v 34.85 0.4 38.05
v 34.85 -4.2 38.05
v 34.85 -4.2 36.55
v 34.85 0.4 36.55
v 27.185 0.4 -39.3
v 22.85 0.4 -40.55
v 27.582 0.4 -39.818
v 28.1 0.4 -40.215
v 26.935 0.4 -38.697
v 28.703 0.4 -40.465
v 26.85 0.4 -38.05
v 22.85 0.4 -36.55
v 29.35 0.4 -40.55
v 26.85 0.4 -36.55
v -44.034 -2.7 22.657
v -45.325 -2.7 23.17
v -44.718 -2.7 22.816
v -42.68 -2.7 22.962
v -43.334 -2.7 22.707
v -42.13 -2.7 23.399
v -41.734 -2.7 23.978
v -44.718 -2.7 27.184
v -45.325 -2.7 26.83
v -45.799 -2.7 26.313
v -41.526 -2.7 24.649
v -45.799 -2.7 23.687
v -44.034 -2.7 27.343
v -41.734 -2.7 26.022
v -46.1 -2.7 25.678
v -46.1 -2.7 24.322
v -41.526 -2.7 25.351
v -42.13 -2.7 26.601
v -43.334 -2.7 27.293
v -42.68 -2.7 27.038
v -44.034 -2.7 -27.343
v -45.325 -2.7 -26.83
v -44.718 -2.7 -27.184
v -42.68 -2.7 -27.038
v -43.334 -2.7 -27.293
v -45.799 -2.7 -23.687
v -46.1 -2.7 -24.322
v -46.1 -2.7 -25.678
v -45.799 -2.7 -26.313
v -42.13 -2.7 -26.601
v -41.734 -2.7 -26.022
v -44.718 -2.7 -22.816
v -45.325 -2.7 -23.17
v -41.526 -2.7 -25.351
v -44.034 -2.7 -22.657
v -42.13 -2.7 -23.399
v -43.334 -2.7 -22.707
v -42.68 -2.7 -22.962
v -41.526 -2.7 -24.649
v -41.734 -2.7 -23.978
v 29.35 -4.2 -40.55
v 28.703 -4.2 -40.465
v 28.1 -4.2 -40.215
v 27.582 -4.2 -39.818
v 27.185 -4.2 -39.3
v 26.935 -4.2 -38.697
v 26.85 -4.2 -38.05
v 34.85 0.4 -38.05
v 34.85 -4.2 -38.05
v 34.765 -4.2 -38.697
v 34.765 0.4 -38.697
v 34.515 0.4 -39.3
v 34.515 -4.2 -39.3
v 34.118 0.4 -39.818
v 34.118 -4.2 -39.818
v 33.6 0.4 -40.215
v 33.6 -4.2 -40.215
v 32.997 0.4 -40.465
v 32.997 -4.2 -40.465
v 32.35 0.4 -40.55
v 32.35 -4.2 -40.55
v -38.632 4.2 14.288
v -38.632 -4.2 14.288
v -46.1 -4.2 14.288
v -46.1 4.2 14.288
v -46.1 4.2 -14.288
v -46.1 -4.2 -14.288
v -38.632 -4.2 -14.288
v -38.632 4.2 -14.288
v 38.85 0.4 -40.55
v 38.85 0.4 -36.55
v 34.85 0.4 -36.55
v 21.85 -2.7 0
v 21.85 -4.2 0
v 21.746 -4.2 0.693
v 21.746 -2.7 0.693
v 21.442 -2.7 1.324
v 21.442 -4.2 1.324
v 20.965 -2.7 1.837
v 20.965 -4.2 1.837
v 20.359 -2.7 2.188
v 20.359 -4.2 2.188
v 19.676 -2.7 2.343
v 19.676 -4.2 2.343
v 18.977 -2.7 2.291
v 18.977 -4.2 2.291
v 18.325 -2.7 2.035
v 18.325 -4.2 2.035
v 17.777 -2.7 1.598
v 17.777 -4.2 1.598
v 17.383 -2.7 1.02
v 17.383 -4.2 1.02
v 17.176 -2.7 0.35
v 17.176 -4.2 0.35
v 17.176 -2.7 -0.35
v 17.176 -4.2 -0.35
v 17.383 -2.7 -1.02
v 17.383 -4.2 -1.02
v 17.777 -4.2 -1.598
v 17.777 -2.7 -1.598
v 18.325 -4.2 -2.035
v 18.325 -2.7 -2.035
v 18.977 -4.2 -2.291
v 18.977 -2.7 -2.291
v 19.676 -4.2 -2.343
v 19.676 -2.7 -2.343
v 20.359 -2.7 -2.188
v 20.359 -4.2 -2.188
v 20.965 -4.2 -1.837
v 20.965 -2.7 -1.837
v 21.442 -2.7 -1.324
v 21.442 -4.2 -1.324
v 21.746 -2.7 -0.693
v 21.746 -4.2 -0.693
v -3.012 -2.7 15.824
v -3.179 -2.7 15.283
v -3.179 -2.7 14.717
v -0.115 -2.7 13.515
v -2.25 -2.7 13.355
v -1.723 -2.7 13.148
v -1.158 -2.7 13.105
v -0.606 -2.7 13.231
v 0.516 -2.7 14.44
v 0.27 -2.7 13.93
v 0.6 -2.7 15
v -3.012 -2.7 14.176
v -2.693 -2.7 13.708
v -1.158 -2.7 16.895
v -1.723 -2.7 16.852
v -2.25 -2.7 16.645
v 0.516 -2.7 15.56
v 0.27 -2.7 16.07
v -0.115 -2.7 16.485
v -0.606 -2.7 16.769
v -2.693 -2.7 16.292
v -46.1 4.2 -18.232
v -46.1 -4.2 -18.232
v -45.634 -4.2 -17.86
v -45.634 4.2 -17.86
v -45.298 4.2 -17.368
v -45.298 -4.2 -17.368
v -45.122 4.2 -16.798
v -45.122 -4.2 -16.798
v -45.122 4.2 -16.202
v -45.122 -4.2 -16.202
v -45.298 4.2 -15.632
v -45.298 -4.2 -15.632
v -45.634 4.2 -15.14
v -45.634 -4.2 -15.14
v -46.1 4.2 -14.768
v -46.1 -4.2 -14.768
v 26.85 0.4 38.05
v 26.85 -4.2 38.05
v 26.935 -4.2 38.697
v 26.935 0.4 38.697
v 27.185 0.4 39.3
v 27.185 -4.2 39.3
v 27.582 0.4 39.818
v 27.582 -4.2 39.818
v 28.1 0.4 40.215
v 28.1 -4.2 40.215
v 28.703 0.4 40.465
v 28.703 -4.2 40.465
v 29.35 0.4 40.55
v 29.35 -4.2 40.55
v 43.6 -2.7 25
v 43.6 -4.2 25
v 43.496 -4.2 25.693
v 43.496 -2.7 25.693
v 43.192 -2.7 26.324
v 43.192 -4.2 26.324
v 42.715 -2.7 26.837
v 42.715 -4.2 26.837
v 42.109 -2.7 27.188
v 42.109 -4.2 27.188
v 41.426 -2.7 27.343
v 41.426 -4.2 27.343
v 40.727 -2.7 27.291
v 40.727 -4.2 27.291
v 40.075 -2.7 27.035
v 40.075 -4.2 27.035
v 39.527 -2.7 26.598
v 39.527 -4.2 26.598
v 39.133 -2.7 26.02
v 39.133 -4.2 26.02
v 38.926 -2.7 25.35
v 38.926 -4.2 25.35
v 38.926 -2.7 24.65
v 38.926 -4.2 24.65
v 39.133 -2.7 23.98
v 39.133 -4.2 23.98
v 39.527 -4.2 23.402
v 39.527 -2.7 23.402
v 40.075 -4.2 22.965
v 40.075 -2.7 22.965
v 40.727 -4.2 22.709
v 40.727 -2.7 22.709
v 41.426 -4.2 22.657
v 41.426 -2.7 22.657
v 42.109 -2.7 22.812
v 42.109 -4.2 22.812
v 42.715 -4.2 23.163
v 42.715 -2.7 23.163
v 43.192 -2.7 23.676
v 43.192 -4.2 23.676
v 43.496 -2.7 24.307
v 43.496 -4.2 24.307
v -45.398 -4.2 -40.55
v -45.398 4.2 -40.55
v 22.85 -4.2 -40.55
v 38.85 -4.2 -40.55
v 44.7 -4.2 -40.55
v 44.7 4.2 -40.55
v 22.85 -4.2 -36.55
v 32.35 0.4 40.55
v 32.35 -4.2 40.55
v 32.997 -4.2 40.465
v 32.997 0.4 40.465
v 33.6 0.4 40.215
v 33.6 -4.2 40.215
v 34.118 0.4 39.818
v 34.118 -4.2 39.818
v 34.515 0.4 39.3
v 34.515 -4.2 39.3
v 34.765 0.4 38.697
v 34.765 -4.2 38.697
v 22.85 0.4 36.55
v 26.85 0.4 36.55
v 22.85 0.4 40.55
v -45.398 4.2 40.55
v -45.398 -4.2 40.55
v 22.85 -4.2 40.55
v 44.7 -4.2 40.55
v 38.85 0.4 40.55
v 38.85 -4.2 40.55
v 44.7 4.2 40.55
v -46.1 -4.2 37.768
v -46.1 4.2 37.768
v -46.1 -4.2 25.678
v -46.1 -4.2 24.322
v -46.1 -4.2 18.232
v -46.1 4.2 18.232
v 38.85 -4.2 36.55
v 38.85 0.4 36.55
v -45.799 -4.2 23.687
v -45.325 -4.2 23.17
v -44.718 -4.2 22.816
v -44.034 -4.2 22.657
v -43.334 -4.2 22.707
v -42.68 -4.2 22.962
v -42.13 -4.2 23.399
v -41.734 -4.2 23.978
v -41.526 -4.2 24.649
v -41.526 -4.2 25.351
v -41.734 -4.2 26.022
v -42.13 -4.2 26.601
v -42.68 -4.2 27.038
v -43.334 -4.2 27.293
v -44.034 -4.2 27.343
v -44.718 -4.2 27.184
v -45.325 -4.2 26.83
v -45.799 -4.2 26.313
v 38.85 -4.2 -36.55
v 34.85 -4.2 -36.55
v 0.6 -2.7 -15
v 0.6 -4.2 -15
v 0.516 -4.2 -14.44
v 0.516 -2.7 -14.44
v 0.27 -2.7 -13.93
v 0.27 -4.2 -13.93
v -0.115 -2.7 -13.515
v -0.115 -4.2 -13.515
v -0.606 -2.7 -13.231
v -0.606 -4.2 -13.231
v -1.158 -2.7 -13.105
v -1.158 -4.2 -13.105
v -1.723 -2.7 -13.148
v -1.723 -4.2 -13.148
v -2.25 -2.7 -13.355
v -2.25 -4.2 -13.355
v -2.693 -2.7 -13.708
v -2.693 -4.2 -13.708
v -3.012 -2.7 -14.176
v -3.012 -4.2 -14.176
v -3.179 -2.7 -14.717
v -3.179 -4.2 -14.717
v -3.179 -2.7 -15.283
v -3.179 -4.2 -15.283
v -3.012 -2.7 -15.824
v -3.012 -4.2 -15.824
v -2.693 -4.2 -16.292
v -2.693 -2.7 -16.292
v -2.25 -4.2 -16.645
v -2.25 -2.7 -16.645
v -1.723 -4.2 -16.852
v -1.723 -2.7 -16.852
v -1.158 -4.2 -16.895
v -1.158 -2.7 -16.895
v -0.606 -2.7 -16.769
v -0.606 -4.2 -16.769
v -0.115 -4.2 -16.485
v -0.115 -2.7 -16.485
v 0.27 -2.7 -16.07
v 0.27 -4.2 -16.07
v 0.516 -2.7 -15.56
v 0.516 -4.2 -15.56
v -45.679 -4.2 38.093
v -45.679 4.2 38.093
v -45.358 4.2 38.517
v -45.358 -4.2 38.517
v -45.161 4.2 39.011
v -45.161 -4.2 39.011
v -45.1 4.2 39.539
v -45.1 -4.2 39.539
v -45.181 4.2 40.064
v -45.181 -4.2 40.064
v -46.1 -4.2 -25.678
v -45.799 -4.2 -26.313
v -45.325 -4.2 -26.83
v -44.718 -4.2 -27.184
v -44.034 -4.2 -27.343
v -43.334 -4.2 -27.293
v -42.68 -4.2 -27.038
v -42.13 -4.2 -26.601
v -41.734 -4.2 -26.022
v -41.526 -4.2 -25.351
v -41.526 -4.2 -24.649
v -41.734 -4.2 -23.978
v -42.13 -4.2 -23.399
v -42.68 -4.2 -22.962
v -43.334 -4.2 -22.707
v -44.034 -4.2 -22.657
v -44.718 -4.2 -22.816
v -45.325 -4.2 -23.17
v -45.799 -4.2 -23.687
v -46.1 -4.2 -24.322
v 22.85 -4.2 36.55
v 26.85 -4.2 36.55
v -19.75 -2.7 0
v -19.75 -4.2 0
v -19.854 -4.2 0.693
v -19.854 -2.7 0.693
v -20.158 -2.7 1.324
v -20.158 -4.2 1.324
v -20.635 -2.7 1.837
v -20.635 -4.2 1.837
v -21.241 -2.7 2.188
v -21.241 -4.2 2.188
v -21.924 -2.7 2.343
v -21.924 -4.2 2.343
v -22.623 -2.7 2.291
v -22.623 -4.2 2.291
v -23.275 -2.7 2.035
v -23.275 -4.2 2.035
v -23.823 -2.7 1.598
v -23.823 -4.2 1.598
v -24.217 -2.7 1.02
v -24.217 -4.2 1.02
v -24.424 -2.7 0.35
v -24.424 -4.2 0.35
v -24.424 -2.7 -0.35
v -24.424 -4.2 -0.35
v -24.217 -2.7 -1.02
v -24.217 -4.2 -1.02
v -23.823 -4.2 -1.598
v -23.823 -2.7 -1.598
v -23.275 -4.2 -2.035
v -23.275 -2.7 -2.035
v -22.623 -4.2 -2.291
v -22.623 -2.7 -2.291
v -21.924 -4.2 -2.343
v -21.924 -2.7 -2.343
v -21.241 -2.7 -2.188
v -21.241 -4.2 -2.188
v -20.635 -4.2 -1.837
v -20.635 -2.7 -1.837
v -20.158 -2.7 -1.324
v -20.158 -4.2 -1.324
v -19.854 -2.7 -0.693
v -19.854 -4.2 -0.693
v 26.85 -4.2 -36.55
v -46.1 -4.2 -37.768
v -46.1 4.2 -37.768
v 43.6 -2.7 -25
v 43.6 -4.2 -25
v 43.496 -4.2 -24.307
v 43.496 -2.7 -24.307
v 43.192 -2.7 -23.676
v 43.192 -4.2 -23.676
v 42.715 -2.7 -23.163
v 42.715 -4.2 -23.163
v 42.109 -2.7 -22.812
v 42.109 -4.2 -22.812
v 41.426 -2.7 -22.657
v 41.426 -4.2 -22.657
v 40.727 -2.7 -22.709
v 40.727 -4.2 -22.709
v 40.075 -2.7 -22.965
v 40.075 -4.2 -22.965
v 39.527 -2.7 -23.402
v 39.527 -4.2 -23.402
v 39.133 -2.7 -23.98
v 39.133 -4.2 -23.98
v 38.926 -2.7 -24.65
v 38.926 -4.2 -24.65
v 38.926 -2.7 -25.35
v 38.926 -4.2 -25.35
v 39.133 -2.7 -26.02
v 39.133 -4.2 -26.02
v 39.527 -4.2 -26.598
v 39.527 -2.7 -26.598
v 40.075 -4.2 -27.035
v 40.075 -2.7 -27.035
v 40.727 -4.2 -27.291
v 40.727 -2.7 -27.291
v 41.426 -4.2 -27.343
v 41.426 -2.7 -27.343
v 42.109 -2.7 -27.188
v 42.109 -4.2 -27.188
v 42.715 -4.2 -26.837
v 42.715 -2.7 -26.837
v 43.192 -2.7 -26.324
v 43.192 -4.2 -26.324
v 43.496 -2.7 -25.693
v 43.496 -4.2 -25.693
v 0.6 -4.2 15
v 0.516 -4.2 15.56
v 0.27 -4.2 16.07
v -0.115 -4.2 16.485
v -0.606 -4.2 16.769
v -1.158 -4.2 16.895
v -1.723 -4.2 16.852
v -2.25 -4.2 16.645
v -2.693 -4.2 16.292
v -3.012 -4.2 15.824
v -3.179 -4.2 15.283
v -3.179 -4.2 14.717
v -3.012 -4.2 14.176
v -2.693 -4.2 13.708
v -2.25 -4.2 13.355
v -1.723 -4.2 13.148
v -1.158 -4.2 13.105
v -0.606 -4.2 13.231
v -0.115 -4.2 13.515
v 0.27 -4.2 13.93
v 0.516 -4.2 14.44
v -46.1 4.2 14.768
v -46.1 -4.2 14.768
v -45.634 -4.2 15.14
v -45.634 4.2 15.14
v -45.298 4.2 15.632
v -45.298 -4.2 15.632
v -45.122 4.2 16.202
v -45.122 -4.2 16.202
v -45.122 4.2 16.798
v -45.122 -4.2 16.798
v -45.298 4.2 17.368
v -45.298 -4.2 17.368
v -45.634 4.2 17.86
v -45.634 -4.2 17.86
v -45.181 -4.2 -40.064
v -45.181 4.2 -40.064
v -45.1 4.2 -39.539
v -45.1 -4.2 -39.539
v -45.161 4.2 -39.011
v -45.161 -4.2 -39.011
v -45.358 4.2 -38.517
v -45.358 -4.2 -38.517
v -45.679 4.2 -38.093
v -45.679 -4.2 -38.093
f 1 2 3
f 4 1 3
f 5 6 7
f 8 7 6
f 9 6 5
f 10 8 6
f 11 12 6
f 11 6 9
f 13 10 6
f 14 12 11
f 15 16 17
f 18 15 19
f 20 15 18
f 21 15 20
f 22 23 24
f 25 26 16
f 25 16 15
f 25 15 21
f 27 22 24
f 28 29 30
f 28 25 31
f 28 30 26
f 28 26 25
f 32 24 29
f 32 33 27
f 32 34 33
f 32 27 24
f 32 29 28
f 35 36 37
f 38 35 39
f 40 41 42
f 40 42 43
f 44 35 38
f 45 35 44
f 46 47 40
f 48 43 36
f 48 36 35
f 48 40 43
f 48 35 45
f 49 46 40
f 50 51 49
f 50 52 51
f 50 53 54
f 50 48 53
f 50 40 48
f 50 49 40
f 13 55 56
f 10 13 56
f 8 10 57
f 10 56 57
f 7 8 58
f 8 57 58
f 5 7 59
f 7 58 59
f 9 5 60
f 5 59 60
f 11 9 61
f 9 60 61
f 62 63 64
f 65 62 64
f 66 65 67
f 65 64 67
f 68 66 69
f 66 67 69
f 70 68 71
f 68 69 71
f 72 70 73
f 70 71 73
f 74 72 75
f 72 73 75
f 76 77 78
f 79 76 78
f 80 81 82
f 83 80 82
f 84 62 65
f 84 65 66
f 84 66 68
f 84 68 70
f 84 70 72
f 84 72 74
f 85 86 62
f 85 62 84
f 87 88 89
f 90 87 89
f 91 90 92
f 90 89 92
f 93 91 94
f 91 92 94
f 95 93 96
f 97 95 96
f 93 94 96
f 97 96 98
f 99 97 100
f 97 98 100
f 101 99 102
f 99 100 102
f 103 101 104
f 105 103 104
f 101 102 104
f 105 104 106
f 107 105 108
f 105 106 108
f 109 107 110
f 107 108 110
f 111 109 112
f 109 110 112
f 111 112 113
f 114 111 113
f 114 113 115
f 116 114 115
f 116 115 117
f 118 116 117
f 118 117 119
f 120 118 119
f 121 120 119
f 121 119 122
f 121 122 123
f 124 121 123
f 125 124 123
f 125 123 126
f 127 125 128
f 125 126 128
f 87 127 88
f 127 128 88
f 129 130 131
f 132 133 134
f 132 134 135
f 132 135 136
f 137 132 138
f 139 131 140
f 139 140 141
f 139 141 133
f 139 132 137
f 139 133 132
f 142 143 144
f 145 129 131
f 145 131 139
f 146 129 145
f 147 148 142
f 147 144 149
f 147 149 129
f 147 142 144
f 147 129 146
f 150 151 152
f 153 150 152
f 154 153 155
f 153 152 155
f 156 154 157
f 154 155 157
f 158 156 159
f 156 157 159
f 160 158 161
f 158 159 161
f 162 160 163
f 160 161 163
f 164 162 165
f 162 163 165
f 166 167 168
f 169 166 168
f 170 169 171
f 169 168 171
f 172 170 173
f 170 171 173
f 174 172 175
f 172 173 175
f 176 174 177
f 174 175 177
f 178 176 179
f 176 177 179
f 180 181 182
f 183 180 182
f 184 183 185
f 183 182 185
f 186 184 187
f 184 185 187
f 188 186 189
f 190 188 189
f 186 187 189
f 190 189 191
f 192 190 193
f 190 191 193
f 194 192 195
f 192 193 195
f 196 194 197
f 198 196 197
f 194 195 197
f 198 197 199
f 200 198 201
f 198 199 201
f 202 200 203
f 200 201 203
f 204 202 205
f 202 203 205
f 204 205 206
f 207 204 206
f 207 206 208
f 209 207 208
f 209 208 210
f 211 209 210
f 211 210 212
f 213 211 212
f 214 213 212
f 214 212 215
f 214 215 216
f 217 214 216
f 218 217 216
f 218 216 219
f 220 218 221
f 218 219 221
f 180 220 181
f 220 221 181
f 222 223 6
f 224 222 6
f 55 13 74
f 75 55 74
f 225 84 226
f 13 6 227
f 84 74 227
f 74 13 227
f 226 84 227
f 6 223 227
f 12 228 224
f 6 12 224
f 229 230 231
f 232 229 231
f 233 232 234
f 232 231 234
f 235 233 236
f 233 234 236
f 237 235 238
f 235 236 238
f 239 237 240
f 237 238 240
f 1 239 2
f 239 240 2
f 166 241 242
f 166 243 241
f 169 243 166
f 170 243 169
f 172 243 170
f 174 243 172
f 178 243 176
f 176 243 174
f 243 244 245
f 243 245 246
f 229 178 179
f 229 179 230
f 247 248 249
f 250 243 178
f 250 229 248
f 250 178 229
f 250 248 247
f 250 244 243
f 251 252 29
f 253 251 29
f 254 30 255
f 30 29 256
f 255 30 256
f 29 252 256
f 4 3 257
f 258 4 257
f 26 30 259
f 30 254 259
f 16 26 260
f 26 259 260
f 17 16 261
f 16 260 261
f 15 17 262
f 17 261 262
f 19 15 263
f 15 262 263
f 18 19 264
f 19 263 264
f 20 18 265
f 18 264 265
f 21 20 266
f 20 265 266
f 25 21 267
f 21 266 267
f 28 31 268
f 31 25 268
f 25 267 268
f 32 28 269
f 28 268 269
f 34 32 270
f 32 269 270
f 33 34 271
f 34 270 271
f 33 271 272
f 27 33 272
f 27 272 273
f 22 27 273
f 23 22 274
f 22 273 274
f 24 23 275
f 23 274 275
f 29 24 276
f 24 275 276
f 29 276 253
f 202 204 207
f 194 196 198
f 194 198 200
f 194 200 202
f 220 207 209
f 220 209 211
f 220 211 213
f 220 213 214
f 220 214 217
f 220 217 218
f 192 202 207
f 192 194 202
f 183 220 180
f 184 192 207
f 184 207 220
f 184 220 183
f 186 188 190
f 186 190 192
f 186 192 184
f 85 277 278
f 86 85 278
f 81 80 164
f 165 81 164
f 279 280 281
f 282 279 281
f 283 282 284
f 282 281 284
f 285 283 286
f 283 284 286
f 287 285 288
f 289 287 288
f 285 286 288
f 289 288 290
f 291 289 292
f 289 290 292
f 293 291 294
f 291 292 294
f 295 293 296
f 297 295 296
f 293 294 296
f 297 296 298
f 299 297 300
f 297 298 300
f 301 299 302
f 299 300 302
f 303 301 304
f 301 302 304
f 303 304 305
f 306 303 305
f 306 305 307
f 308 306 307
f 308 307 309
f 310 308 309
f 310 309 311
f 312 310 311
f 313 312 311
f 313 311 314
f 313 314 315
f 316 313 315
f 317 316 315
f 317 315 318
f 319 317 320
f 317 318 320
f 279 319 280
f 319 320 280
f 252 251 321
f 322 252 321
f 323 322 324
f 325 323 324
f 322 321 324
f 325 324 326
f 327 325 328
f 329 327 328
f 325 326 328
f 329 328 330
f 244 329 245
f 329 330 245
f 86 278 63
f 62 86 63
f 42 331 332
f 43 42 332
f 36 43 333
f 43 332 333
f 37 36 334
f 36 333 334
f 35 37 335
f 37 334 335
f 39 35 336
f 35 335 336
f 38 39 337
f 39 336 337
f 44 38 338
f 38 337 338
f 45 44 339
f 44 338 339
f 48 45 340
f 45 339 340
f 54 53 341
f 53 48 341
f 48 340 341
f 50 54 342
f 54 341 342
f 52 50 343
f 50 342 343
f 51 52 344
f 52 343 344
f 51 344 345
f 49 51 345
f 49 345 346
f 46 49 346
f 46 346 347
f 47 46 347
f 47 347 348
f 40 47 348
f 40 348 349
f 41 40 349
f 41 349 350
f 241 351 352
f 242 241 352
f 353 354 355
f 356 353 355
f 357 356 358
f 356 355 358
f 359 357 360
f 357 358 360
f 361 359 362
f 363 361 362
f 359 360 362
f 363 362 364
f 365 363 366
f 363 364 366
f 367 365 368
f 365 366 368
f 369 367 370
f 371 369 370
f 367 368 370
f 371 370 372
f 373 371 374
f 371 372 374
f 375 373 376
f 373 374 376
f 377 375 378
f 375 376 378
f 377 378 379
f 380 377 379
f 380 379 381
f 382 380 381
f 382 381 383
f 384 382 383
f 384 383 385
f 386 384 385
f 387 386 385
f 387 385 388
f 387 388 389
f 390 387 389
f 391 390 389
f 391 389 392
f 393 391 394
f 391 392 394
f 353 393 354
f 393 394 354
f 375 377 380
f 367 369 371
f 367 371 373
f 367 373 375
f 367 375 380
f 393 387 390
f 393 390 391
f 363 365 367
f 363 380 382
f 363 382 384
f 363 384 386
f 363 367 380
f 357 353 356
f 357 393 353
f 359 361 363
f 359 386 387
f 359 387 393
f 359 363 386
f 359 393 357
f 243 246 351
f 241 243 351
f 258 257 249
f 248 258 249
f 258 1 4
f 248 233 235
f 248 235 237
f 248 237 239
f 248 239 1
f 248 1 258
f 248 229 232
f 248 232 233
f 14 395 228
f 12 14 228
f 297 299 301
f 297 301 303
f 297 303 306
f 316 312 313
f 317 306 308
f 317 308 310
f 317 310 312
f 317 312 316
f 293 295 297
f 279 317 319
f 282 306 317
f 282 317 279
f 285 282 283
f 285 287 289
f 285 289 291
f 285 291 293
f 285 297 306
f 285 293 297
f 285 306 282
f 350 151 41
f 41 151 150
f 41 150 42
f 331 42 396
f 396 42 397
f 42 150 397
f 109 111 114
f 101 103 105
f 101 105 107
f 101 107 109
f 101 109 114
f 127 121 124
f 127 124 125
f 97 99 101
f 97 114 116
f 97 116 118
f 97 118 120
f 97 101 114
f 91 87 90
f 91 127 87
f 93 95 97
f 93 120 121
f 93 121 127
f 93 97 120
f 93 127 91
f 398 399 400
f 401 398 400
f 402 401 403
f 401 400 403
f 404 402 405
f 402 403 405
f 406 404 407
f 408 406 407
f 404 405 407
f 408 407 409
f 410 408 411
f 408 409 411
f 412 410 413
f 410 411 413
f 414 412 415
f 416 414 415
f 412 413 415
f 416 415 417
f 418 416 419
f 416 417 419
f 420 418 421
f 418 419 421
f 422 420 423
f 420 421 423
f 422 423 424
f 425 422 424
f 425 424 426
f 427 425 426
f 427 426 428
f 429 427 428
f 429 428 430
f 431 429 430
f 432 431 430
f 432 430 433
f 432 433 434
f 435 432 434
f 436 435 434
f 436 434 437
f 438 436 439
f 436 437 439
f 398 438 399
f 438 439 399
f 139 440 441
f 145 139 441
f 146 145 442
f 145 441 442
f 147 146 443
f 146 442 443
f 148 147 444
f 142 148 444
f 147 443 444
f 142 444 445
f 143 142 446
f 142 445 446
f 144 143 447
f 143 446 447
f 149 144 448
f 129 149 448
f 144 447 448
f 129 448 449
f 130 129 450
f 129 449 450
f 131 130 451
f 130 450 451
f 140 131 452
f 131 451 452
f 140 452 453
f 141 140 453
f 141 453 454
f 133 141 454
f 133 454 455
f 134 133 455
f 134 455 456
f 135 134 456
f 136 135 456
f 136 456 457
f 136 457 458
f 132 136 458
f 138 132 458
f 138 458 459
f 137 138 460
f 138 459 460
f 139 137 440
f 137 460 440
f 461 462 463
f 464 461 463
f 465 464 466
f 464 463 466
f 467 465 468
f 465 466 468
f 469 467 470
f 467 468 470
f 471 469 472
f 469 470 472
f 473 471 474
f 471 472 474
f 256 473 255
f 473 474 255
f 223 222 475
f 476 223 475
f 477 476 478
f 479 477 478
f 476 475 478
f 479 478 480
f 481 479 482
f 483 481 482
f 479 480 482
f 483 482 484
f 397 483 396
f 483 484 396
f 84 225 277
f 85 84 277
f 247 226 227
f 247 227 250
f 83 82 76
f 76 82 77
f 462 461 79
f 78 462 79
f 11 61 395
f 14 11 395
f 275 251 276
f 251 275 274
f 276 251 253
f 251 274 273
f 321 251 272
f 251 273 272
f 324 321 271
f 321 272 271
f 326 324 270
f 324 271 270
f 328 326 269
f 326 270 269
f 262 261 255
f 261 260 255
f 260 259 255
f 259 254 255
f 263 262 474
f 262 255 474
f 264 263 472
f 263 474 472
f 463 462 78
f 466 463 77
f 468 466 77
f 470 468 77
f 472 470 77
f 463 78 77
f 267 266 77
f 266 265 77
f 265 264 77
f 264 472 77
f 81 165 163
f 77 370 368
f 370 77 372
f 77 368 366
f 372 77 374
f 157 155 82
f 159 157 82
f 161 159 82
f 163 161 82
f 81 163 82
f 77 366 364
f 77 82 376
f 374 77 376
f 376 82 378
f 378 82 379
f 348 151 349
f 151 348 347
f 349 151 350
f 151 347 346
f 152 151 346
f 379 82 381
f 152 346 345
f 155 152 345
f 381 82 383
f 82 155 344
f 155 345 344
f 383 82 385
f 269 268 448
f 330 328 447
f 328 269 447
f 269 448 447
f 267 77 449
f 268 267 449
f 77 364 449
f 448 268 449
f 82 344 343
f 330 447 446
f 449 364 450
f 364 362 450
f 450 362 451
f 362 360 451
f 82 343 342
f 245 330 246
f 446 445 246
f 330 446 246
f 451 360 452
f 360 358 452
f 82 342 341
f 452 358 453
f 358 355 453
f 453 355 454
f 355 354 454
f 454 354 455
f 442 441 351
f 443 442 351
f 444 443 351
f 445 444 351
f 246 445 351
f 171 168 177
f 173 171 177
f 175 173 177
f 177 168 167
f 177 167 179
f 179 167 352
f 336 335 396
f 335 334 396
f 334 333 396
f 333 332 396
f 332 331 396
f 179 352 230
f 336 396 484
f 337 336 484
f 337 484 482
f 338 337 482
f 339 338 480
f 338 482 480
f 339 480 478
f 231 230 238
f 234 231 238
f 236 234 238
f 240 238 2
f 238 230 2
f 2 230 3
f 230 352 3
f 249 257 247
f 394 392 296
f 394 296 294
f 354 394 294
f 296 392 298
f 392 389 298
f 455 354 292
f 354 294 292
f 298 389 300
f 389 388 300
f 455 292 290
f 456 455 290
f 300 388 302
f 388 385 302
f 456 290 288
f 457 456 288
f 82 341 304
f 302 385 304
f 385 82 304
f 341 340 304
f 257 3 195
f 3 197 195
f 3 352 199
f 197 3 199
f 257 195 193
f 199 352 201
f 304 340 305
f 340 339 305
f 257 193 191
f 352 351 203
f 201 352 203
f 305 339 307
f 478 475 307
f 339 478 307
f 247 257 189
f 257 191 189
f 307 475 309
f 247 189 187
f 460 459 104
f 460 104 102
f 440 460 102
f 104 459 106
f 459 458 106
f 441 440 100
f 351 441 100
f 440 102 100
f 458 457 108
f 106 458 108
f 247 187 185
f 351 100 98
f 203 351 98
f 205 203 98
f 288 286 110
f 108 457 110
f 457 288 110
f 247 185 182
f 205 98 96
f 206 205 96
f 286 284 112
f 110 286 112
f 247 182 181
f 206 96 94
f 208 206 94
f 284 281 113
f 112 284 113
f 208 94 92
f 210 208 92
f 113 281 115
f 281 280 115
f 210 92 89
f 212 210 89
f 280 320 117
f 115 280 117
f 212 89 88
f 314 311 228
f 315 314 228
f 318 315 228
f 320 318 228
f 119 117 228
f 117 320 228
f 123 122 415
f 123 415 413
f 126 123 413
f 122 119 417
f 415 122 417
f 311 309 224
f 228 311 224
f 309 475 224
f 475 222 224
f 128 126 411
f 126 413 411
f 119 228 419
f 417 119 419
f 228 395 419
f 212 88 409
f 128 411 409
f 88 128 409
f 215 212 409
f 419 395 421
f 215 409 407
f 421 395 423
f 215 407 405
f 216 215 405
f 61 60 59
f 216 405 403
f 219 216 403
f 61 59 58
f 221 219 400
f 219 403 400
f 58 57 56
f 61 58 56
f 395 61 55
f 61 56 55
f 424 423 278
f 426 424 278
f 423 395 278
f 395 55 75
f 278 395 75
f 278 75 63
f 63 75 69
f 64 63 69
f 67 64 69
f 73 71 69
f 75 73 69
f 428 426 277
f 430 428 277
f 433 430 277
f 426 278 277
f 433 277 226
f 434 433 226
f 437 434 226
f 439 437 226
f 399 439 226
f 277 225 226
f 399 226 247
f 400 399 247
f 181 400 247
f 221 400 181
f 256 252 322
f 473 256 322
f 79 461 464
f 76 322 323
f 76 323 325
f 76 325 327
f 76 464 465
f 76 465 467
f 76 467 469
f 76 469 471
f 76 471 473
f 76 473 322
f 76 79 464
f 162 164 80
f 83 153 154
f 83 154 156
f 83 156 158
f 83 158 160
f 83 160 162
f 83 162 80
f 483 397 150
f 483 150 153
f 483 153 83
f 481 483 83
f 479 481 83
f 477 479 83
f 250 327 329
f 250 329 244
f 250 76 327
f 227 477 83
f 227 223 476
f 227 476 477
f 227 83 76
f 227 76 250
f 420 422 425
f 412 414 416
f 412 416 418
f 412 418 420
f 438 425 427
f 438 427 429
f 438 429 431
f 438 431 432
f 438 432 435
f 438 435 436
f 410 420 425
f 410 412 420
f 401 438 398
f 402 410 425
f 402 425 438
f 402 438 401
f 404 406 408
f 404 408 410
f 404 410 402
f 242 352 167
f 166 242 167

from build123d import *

# Parameters (mm, degrees)
SKETCH1_W           = 92.2
SKETCH1_H           = 81.1
BOSS_EXTRUDE1_DEPTH = 4.2
CUT_EXTRUDE1_DEPTH  = 4.6
CUT_EXTRUDE2_DEPTH  = 9.4
CUT_EXTRUDE3_DEPTH  = 9.4
SKETCH5_R           = 2.35
SKETCH5_R_2         = 1.9
CUT_EXTRUDE4_DEPTH  = 1.5
SKETCH6_W           = 1.4
SKETCH6_H           = 81.1
CUT_EXTRUDE5_DEPTH  = 9.4


with BuildPart() as part:
    # Sketch1 → Boss-Extrude1 (new body, symmetric)
    with BuildSketch(Plane(origin=(0, 0, 0), x_dir=(1, 0, 0), z_dir=(0, 1, 0))):
        Rectangle(SKETCH1_W, SKETCH1_H)
    extrude(amount=BOSS_EXTRUDE1_DEPTH, both=True)

    # Sketch2 → Cut-Extrude1 (cut)
    with BuildSketch(Plane.XZ.offset(4.2)):
        with BuildLine():
            Line((38.85, 40.55), (34.85, 40.55))
            Line((34.85, 40.55), (32.35, 40.55))
            ThreePointArc((32.35, 40.55), (34.117766953, 39.817766953), (34.85, 38.05))
            Line((34.85, 38.05), (34.85, 36.55))
            Line((34.85, 36.55), (38.85, 36.55))
            Line((38.85, 36.55), (38.85, 40.55))
        make_face()
        with BuildLine():
            Line((22.85, 36.55), (26.85, 36.55))
            Line((26.85, 36.55), (26.85, 38.05))
            ThreePointArc((26.85, 38.05), (27.582233047, 39.817766953), (29.35, 40.55))
            Line((29.35, 40.55), (26.85, 40.55))
            Line((26.85, 40.55), (22.85, 40.55))
            Line((22.85, 40.55), (22.85, 36.55))
        make_face()
        with BuildLine():
            Line((22.85, -36.55), (22.85, -40.55))
            Line((22.85, -40.55), (29.35, -40.55))
            ThreePointArc((29.35, -40.55), (27.582233047, -39.817766953), (26.85, -38.05))
            Line((26.85, -38.05), (26.85, -36.55))
            Line((26.85, -36.55), (22.85, -36.55))
        make_face()
        with BuildLine():
            Line((34.85, -36.55), (34.85, -38.05))
            ThreePointArc((34.85, -38.05), (34.117766953, -39.817766953), (32.35, -40.55))
            Line((32.35, -40.55), (38.85, -40.55))
            Line((38.85, -40.55), (38.85, -36.55))
            Line((38.85, -36.55), (34.85, -36.55))
        make_face()
    extrude(amount=-CUT_EXTRUDE1_DEPTH, mode=Mode.SUBTRACT)

    # Sketch3 → Cut-Extrude2 (cut, through all)
    with BuildSketch(Plane.XZ.offset(4.2)):
        with BuildLine():
            Line((45, 40.55), (46.1, 40.55))
            Line((46.1, 40.55), (46.1, 34.4))
            Line((46.1, 34.4), (45.5, 34.4))
            ThreePointArc((45.5, 34.4), (45.146446609, 34.546446609), (45, 34.9))
            Line((45, 34.9), (45, 40.55))
        make_face()
        with BuildLine():
            Line((46.1, -34.4), (46.1, -40.55))
            Line((46.1, -40.55), (45, -40.55))
            Line((45, -40.55), (45, -34.9))
            ThreePointArc((45, -34.9), (45.146446609, -34.546446609), (45.5, -34.4))
            Line((45.5, -34.4), (46.1, -34.4))
        make_face()
        with BuildLine():
            Line((-46.1, -37.767949192), (-46.1, -40.55))
            Line((-46.1, -40.55), (-45.397795547, -40.55))
            ThreePointArc((-45.397795547, -40.55), (-45.160817466, -39.010539992), (-46.1, -37.767949192))
        make_face()
        with BuildLine():
            Line((-46.1, -14.767949192), (-46.1, -18.232050808))
            ThreePointArc((-46.1, -18.232050808), (-45.1, -16.5), (-46.1, -14.767949192))
        make_face()
        with BuildLine():
            Line((-46.1, 18.232050808), (-46.1, 14.767949192))
            ThreePointArc((-46.1, 14.767949192), (-45.1, 16.5), (-46.1, 18.232050808))
        make_face()
        with BuildLine():
            Line((-45.397795547, 40.55), (-46.1, 40.55))
            Line((-46.1, 40.55), (-46.1, 37.767949192))
            ThreePointArc((-46.1, 37.767949192), (-45.160817466, 39.010539992), (-45.397795547, 40.55))
        make_face()
    extrude(amount=-CUT_EXTRUDE2_DEPTH, mode=Mode.SUBTRACT)

    # Sketch4 → Cut-Extrude3 (cut, through all)
    with BuildSketch(Plane.XZ.offset(4.2)):
        Polygon((-38.632, 11.8872), (-38.632, 12.2428), (-38.632, 14.2875), (-40.537, 14.2875), (-46.125, 14.2875), (-46.125, 13.6525), (-46.125, -14.2875), (-40.537, -14.2875), (-38.632, -14.2875), (-38.632, -12.2428), (-38.632, -11.8872), align=None)
    extrude(amount=-CUT_EXTRUDE3_DEPTH, mode=Mode.SUBTRACT)

    # Sketch5 → Cut-Extrude4 (cut)
    with BuildSketch(Plane.XZ.offset(4.2)):
        with Locations((41.25, -25)):
            Circle(SKETCH5_R)
        with Locations((41.25, 25)):
            Circle(SKETCH5_R)
        with Locations((19.5, 0)):
            Circle(SKETCH5_R)
        with Locations((-1.3, 15)):
            Circle(SKETCH5_R_2)
        with Locations((-1.3, -15)):
            Circle(SKETCH5_R_2)
        with Locations((-22.1, 0)):
            Circle(SKETCH5_R)
        with Locations((-43.85, -25)):
            Circle(SKETCH5_R)
        with Locations((-43.85, 25)):
            Circle(SKETCH5_R)
    extrude(amount=-CUT_EXTRUDE4_DEPTH, mode=Mode.SUBTRACT)

    # Sketch6 → Cut-Extrude5 (cut, through all)
    with BuildSketch(Plane.XZ.offset(4.2)):
        with Locations((45.4, 0)):
            Rectangle(SKETCH6_W, SKETCH6_H)
    extrude(amount=-CUT_EXTRUDE5_DEPTH, mode=Mode.SUBTRACT)


solid = part.part
